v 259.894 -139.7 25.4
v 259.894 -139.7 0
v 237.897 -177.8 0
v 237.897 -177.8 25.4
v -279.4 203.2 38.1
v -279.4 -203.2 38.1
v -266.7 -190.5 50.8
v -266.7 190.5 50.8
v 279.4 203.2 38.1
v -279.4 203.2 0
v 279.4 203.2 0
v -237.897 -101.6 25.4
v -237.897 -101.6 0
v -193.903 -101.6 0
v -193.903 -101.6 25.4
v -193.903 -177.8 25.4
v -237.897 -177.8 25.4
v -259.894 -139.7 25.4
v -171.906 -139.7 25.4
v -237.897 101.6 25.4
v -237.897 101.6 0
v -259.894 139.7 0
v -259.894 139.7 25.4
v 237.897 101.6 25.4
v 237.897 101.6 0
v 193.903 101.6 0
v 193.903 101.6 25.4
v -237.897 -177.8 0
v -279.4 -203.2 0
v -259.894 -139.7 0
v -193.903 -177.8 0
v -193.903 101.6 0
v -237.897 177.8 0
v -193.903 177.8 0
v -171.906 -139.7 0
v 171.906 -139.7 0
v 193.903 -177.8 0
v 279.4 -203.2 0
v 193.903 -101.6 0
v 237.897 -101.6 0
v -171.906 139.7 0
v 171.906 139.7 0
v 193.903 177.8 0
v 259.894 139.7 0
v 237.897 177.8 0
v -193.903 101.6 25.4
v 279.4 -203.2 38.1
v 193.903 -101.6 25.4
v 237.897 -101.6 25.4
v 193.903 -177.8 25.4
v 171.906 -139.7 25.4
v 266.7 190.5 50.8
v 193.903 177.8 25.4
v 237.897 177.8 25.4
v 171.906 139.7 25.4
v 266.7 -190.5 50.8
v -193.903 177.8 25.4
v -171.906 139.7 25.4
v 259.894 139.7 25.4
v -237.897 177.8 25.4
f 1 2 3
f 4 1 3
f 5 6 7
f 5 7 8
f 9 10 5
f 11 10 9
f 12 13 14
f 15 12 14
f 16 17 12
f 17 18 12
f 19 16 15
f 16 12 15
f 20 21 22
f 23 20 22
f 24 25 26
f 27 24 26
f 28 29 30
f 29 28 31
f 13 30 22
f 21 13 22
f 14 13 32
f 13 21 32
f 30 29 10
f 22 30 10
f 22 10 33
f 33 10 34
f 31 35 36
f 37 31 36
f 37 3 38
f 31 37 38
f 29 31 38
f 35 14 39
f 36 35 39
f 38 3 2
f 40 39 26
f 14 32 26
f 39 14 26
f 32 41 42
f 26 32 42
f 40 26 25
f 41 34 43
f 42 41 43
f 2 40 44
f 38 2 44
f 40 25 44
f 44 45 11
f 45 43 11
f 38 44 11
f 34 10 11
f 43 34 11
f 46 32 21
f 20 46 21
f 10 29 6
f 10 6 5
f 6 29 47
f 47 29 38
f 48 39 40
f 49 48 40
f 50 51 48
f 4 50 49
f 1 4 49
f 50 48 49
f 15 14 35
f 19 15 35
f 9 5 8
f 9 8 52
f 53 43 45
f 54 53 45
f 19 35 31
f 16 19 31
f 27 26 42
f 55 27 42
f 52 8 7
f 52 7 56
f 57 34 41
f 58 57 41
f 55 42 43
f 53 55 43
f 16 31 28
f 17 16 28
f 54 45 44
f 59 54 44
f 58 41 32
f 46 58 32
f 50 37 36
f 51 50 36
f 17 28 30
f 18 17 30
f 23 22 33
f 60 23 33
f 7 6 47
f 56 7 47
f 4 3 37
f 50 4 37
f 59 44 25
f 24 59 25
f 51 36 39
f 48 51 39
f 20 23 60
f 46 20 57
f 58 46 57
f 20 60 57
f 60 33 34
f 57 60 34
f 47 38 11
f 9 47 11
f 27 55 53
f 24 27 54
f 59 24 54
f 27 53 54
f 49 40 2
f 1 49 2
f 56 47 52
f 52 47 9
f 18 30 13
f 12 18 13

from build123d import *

# Parameters (mm, degrees)
F0_W     = 558.8
F0_H     = 406.4
F1_DEPTH = 50.8
F3_DEPTH = 25.4
F4_SIZE  = 12.7


with BuildPart() as f1:
    # F0 (on Top) → F1 (new body)
    with BuildSketch(Plane.XY):
        Rectangle(F0_W, F0_H)
        Polygon((-171.905909, -139.7), (-193.902955, -177.8), (-237.897045, -177.8), (-259.894091, -139.7), (-237.897045, -101.6), (-193.902955, -101.6), align=None, mode=Mode.SUBTRACT)
        Polygon((259.894091, -139.7), (237.897045, -177.8), (193.902955, -177.8), (171.905909, -139.7), (193.902955, -101.6), (237.897045, -101.6), align=None, mode=Mode.SUBTRACT)
        Polygon((-171.905909, 139.7), (-193.902955, 101.6), (-237.897045, 101.6), (-259.894091, 139.7), (-237.897045, 177.8), (-193.902955, 177.8), align=None, mode=Mode.SUBTRACT)
        Polygon((259.894091, 139.7), (237.897045, 101.6), (193.902955, 101.6), (171.905909, 139.7), (193.902955, 177.8), (237.897045, 177.8), align=None, mode=Mode.SUBTRACT)
    extrude(amount=F1_DEPTH)

    # F2 (on face) → F3 (join)
    with BuildSketch(Plane.XY.offset(50.8)):
        Polygon((-237.897045, 101.6), (-193.902955, 101.6), (-171.905909, 139.7), (-193.902955, 177.8), (-237.897045, 177.8), (-259.894091, 139.7), align=None)
        Polygon((193.902955, 101.6), (237.897045, 101.6), (259.894091, 139.7), (237.897045, 177.8), (193.902955, 177.8), (171.905909, 139.7), align=None)
        Polygon((-237.897045, -177.8), (-193.902955, -177.8), (-171.905909, -139.7), (-193.902955, -101.6), (-237.897045, -101.6), (-259.894091, -139.7), align=None)
        Polygon((193.902955, -177.8), (237.897045, -177.8), (259.894091, -139.7), (237.897045, -101.6), (193.902955, -101.6), (171.905909, -139.7), align=None)
    extrude(amount=-F3_DEPTH)

    # F4
    f4_edges = [f1.edges().sort_by_distance(p)[0] for p in [
        (279.4, 0, 50.8),
        (0, -203.2, 50.8),
        (0, 203.2, 50.8),
        (-279.4, 0, 50.8),
    ]]
    chamfer(f4_edges, length=F4_SIZE)


solid = f1.part
